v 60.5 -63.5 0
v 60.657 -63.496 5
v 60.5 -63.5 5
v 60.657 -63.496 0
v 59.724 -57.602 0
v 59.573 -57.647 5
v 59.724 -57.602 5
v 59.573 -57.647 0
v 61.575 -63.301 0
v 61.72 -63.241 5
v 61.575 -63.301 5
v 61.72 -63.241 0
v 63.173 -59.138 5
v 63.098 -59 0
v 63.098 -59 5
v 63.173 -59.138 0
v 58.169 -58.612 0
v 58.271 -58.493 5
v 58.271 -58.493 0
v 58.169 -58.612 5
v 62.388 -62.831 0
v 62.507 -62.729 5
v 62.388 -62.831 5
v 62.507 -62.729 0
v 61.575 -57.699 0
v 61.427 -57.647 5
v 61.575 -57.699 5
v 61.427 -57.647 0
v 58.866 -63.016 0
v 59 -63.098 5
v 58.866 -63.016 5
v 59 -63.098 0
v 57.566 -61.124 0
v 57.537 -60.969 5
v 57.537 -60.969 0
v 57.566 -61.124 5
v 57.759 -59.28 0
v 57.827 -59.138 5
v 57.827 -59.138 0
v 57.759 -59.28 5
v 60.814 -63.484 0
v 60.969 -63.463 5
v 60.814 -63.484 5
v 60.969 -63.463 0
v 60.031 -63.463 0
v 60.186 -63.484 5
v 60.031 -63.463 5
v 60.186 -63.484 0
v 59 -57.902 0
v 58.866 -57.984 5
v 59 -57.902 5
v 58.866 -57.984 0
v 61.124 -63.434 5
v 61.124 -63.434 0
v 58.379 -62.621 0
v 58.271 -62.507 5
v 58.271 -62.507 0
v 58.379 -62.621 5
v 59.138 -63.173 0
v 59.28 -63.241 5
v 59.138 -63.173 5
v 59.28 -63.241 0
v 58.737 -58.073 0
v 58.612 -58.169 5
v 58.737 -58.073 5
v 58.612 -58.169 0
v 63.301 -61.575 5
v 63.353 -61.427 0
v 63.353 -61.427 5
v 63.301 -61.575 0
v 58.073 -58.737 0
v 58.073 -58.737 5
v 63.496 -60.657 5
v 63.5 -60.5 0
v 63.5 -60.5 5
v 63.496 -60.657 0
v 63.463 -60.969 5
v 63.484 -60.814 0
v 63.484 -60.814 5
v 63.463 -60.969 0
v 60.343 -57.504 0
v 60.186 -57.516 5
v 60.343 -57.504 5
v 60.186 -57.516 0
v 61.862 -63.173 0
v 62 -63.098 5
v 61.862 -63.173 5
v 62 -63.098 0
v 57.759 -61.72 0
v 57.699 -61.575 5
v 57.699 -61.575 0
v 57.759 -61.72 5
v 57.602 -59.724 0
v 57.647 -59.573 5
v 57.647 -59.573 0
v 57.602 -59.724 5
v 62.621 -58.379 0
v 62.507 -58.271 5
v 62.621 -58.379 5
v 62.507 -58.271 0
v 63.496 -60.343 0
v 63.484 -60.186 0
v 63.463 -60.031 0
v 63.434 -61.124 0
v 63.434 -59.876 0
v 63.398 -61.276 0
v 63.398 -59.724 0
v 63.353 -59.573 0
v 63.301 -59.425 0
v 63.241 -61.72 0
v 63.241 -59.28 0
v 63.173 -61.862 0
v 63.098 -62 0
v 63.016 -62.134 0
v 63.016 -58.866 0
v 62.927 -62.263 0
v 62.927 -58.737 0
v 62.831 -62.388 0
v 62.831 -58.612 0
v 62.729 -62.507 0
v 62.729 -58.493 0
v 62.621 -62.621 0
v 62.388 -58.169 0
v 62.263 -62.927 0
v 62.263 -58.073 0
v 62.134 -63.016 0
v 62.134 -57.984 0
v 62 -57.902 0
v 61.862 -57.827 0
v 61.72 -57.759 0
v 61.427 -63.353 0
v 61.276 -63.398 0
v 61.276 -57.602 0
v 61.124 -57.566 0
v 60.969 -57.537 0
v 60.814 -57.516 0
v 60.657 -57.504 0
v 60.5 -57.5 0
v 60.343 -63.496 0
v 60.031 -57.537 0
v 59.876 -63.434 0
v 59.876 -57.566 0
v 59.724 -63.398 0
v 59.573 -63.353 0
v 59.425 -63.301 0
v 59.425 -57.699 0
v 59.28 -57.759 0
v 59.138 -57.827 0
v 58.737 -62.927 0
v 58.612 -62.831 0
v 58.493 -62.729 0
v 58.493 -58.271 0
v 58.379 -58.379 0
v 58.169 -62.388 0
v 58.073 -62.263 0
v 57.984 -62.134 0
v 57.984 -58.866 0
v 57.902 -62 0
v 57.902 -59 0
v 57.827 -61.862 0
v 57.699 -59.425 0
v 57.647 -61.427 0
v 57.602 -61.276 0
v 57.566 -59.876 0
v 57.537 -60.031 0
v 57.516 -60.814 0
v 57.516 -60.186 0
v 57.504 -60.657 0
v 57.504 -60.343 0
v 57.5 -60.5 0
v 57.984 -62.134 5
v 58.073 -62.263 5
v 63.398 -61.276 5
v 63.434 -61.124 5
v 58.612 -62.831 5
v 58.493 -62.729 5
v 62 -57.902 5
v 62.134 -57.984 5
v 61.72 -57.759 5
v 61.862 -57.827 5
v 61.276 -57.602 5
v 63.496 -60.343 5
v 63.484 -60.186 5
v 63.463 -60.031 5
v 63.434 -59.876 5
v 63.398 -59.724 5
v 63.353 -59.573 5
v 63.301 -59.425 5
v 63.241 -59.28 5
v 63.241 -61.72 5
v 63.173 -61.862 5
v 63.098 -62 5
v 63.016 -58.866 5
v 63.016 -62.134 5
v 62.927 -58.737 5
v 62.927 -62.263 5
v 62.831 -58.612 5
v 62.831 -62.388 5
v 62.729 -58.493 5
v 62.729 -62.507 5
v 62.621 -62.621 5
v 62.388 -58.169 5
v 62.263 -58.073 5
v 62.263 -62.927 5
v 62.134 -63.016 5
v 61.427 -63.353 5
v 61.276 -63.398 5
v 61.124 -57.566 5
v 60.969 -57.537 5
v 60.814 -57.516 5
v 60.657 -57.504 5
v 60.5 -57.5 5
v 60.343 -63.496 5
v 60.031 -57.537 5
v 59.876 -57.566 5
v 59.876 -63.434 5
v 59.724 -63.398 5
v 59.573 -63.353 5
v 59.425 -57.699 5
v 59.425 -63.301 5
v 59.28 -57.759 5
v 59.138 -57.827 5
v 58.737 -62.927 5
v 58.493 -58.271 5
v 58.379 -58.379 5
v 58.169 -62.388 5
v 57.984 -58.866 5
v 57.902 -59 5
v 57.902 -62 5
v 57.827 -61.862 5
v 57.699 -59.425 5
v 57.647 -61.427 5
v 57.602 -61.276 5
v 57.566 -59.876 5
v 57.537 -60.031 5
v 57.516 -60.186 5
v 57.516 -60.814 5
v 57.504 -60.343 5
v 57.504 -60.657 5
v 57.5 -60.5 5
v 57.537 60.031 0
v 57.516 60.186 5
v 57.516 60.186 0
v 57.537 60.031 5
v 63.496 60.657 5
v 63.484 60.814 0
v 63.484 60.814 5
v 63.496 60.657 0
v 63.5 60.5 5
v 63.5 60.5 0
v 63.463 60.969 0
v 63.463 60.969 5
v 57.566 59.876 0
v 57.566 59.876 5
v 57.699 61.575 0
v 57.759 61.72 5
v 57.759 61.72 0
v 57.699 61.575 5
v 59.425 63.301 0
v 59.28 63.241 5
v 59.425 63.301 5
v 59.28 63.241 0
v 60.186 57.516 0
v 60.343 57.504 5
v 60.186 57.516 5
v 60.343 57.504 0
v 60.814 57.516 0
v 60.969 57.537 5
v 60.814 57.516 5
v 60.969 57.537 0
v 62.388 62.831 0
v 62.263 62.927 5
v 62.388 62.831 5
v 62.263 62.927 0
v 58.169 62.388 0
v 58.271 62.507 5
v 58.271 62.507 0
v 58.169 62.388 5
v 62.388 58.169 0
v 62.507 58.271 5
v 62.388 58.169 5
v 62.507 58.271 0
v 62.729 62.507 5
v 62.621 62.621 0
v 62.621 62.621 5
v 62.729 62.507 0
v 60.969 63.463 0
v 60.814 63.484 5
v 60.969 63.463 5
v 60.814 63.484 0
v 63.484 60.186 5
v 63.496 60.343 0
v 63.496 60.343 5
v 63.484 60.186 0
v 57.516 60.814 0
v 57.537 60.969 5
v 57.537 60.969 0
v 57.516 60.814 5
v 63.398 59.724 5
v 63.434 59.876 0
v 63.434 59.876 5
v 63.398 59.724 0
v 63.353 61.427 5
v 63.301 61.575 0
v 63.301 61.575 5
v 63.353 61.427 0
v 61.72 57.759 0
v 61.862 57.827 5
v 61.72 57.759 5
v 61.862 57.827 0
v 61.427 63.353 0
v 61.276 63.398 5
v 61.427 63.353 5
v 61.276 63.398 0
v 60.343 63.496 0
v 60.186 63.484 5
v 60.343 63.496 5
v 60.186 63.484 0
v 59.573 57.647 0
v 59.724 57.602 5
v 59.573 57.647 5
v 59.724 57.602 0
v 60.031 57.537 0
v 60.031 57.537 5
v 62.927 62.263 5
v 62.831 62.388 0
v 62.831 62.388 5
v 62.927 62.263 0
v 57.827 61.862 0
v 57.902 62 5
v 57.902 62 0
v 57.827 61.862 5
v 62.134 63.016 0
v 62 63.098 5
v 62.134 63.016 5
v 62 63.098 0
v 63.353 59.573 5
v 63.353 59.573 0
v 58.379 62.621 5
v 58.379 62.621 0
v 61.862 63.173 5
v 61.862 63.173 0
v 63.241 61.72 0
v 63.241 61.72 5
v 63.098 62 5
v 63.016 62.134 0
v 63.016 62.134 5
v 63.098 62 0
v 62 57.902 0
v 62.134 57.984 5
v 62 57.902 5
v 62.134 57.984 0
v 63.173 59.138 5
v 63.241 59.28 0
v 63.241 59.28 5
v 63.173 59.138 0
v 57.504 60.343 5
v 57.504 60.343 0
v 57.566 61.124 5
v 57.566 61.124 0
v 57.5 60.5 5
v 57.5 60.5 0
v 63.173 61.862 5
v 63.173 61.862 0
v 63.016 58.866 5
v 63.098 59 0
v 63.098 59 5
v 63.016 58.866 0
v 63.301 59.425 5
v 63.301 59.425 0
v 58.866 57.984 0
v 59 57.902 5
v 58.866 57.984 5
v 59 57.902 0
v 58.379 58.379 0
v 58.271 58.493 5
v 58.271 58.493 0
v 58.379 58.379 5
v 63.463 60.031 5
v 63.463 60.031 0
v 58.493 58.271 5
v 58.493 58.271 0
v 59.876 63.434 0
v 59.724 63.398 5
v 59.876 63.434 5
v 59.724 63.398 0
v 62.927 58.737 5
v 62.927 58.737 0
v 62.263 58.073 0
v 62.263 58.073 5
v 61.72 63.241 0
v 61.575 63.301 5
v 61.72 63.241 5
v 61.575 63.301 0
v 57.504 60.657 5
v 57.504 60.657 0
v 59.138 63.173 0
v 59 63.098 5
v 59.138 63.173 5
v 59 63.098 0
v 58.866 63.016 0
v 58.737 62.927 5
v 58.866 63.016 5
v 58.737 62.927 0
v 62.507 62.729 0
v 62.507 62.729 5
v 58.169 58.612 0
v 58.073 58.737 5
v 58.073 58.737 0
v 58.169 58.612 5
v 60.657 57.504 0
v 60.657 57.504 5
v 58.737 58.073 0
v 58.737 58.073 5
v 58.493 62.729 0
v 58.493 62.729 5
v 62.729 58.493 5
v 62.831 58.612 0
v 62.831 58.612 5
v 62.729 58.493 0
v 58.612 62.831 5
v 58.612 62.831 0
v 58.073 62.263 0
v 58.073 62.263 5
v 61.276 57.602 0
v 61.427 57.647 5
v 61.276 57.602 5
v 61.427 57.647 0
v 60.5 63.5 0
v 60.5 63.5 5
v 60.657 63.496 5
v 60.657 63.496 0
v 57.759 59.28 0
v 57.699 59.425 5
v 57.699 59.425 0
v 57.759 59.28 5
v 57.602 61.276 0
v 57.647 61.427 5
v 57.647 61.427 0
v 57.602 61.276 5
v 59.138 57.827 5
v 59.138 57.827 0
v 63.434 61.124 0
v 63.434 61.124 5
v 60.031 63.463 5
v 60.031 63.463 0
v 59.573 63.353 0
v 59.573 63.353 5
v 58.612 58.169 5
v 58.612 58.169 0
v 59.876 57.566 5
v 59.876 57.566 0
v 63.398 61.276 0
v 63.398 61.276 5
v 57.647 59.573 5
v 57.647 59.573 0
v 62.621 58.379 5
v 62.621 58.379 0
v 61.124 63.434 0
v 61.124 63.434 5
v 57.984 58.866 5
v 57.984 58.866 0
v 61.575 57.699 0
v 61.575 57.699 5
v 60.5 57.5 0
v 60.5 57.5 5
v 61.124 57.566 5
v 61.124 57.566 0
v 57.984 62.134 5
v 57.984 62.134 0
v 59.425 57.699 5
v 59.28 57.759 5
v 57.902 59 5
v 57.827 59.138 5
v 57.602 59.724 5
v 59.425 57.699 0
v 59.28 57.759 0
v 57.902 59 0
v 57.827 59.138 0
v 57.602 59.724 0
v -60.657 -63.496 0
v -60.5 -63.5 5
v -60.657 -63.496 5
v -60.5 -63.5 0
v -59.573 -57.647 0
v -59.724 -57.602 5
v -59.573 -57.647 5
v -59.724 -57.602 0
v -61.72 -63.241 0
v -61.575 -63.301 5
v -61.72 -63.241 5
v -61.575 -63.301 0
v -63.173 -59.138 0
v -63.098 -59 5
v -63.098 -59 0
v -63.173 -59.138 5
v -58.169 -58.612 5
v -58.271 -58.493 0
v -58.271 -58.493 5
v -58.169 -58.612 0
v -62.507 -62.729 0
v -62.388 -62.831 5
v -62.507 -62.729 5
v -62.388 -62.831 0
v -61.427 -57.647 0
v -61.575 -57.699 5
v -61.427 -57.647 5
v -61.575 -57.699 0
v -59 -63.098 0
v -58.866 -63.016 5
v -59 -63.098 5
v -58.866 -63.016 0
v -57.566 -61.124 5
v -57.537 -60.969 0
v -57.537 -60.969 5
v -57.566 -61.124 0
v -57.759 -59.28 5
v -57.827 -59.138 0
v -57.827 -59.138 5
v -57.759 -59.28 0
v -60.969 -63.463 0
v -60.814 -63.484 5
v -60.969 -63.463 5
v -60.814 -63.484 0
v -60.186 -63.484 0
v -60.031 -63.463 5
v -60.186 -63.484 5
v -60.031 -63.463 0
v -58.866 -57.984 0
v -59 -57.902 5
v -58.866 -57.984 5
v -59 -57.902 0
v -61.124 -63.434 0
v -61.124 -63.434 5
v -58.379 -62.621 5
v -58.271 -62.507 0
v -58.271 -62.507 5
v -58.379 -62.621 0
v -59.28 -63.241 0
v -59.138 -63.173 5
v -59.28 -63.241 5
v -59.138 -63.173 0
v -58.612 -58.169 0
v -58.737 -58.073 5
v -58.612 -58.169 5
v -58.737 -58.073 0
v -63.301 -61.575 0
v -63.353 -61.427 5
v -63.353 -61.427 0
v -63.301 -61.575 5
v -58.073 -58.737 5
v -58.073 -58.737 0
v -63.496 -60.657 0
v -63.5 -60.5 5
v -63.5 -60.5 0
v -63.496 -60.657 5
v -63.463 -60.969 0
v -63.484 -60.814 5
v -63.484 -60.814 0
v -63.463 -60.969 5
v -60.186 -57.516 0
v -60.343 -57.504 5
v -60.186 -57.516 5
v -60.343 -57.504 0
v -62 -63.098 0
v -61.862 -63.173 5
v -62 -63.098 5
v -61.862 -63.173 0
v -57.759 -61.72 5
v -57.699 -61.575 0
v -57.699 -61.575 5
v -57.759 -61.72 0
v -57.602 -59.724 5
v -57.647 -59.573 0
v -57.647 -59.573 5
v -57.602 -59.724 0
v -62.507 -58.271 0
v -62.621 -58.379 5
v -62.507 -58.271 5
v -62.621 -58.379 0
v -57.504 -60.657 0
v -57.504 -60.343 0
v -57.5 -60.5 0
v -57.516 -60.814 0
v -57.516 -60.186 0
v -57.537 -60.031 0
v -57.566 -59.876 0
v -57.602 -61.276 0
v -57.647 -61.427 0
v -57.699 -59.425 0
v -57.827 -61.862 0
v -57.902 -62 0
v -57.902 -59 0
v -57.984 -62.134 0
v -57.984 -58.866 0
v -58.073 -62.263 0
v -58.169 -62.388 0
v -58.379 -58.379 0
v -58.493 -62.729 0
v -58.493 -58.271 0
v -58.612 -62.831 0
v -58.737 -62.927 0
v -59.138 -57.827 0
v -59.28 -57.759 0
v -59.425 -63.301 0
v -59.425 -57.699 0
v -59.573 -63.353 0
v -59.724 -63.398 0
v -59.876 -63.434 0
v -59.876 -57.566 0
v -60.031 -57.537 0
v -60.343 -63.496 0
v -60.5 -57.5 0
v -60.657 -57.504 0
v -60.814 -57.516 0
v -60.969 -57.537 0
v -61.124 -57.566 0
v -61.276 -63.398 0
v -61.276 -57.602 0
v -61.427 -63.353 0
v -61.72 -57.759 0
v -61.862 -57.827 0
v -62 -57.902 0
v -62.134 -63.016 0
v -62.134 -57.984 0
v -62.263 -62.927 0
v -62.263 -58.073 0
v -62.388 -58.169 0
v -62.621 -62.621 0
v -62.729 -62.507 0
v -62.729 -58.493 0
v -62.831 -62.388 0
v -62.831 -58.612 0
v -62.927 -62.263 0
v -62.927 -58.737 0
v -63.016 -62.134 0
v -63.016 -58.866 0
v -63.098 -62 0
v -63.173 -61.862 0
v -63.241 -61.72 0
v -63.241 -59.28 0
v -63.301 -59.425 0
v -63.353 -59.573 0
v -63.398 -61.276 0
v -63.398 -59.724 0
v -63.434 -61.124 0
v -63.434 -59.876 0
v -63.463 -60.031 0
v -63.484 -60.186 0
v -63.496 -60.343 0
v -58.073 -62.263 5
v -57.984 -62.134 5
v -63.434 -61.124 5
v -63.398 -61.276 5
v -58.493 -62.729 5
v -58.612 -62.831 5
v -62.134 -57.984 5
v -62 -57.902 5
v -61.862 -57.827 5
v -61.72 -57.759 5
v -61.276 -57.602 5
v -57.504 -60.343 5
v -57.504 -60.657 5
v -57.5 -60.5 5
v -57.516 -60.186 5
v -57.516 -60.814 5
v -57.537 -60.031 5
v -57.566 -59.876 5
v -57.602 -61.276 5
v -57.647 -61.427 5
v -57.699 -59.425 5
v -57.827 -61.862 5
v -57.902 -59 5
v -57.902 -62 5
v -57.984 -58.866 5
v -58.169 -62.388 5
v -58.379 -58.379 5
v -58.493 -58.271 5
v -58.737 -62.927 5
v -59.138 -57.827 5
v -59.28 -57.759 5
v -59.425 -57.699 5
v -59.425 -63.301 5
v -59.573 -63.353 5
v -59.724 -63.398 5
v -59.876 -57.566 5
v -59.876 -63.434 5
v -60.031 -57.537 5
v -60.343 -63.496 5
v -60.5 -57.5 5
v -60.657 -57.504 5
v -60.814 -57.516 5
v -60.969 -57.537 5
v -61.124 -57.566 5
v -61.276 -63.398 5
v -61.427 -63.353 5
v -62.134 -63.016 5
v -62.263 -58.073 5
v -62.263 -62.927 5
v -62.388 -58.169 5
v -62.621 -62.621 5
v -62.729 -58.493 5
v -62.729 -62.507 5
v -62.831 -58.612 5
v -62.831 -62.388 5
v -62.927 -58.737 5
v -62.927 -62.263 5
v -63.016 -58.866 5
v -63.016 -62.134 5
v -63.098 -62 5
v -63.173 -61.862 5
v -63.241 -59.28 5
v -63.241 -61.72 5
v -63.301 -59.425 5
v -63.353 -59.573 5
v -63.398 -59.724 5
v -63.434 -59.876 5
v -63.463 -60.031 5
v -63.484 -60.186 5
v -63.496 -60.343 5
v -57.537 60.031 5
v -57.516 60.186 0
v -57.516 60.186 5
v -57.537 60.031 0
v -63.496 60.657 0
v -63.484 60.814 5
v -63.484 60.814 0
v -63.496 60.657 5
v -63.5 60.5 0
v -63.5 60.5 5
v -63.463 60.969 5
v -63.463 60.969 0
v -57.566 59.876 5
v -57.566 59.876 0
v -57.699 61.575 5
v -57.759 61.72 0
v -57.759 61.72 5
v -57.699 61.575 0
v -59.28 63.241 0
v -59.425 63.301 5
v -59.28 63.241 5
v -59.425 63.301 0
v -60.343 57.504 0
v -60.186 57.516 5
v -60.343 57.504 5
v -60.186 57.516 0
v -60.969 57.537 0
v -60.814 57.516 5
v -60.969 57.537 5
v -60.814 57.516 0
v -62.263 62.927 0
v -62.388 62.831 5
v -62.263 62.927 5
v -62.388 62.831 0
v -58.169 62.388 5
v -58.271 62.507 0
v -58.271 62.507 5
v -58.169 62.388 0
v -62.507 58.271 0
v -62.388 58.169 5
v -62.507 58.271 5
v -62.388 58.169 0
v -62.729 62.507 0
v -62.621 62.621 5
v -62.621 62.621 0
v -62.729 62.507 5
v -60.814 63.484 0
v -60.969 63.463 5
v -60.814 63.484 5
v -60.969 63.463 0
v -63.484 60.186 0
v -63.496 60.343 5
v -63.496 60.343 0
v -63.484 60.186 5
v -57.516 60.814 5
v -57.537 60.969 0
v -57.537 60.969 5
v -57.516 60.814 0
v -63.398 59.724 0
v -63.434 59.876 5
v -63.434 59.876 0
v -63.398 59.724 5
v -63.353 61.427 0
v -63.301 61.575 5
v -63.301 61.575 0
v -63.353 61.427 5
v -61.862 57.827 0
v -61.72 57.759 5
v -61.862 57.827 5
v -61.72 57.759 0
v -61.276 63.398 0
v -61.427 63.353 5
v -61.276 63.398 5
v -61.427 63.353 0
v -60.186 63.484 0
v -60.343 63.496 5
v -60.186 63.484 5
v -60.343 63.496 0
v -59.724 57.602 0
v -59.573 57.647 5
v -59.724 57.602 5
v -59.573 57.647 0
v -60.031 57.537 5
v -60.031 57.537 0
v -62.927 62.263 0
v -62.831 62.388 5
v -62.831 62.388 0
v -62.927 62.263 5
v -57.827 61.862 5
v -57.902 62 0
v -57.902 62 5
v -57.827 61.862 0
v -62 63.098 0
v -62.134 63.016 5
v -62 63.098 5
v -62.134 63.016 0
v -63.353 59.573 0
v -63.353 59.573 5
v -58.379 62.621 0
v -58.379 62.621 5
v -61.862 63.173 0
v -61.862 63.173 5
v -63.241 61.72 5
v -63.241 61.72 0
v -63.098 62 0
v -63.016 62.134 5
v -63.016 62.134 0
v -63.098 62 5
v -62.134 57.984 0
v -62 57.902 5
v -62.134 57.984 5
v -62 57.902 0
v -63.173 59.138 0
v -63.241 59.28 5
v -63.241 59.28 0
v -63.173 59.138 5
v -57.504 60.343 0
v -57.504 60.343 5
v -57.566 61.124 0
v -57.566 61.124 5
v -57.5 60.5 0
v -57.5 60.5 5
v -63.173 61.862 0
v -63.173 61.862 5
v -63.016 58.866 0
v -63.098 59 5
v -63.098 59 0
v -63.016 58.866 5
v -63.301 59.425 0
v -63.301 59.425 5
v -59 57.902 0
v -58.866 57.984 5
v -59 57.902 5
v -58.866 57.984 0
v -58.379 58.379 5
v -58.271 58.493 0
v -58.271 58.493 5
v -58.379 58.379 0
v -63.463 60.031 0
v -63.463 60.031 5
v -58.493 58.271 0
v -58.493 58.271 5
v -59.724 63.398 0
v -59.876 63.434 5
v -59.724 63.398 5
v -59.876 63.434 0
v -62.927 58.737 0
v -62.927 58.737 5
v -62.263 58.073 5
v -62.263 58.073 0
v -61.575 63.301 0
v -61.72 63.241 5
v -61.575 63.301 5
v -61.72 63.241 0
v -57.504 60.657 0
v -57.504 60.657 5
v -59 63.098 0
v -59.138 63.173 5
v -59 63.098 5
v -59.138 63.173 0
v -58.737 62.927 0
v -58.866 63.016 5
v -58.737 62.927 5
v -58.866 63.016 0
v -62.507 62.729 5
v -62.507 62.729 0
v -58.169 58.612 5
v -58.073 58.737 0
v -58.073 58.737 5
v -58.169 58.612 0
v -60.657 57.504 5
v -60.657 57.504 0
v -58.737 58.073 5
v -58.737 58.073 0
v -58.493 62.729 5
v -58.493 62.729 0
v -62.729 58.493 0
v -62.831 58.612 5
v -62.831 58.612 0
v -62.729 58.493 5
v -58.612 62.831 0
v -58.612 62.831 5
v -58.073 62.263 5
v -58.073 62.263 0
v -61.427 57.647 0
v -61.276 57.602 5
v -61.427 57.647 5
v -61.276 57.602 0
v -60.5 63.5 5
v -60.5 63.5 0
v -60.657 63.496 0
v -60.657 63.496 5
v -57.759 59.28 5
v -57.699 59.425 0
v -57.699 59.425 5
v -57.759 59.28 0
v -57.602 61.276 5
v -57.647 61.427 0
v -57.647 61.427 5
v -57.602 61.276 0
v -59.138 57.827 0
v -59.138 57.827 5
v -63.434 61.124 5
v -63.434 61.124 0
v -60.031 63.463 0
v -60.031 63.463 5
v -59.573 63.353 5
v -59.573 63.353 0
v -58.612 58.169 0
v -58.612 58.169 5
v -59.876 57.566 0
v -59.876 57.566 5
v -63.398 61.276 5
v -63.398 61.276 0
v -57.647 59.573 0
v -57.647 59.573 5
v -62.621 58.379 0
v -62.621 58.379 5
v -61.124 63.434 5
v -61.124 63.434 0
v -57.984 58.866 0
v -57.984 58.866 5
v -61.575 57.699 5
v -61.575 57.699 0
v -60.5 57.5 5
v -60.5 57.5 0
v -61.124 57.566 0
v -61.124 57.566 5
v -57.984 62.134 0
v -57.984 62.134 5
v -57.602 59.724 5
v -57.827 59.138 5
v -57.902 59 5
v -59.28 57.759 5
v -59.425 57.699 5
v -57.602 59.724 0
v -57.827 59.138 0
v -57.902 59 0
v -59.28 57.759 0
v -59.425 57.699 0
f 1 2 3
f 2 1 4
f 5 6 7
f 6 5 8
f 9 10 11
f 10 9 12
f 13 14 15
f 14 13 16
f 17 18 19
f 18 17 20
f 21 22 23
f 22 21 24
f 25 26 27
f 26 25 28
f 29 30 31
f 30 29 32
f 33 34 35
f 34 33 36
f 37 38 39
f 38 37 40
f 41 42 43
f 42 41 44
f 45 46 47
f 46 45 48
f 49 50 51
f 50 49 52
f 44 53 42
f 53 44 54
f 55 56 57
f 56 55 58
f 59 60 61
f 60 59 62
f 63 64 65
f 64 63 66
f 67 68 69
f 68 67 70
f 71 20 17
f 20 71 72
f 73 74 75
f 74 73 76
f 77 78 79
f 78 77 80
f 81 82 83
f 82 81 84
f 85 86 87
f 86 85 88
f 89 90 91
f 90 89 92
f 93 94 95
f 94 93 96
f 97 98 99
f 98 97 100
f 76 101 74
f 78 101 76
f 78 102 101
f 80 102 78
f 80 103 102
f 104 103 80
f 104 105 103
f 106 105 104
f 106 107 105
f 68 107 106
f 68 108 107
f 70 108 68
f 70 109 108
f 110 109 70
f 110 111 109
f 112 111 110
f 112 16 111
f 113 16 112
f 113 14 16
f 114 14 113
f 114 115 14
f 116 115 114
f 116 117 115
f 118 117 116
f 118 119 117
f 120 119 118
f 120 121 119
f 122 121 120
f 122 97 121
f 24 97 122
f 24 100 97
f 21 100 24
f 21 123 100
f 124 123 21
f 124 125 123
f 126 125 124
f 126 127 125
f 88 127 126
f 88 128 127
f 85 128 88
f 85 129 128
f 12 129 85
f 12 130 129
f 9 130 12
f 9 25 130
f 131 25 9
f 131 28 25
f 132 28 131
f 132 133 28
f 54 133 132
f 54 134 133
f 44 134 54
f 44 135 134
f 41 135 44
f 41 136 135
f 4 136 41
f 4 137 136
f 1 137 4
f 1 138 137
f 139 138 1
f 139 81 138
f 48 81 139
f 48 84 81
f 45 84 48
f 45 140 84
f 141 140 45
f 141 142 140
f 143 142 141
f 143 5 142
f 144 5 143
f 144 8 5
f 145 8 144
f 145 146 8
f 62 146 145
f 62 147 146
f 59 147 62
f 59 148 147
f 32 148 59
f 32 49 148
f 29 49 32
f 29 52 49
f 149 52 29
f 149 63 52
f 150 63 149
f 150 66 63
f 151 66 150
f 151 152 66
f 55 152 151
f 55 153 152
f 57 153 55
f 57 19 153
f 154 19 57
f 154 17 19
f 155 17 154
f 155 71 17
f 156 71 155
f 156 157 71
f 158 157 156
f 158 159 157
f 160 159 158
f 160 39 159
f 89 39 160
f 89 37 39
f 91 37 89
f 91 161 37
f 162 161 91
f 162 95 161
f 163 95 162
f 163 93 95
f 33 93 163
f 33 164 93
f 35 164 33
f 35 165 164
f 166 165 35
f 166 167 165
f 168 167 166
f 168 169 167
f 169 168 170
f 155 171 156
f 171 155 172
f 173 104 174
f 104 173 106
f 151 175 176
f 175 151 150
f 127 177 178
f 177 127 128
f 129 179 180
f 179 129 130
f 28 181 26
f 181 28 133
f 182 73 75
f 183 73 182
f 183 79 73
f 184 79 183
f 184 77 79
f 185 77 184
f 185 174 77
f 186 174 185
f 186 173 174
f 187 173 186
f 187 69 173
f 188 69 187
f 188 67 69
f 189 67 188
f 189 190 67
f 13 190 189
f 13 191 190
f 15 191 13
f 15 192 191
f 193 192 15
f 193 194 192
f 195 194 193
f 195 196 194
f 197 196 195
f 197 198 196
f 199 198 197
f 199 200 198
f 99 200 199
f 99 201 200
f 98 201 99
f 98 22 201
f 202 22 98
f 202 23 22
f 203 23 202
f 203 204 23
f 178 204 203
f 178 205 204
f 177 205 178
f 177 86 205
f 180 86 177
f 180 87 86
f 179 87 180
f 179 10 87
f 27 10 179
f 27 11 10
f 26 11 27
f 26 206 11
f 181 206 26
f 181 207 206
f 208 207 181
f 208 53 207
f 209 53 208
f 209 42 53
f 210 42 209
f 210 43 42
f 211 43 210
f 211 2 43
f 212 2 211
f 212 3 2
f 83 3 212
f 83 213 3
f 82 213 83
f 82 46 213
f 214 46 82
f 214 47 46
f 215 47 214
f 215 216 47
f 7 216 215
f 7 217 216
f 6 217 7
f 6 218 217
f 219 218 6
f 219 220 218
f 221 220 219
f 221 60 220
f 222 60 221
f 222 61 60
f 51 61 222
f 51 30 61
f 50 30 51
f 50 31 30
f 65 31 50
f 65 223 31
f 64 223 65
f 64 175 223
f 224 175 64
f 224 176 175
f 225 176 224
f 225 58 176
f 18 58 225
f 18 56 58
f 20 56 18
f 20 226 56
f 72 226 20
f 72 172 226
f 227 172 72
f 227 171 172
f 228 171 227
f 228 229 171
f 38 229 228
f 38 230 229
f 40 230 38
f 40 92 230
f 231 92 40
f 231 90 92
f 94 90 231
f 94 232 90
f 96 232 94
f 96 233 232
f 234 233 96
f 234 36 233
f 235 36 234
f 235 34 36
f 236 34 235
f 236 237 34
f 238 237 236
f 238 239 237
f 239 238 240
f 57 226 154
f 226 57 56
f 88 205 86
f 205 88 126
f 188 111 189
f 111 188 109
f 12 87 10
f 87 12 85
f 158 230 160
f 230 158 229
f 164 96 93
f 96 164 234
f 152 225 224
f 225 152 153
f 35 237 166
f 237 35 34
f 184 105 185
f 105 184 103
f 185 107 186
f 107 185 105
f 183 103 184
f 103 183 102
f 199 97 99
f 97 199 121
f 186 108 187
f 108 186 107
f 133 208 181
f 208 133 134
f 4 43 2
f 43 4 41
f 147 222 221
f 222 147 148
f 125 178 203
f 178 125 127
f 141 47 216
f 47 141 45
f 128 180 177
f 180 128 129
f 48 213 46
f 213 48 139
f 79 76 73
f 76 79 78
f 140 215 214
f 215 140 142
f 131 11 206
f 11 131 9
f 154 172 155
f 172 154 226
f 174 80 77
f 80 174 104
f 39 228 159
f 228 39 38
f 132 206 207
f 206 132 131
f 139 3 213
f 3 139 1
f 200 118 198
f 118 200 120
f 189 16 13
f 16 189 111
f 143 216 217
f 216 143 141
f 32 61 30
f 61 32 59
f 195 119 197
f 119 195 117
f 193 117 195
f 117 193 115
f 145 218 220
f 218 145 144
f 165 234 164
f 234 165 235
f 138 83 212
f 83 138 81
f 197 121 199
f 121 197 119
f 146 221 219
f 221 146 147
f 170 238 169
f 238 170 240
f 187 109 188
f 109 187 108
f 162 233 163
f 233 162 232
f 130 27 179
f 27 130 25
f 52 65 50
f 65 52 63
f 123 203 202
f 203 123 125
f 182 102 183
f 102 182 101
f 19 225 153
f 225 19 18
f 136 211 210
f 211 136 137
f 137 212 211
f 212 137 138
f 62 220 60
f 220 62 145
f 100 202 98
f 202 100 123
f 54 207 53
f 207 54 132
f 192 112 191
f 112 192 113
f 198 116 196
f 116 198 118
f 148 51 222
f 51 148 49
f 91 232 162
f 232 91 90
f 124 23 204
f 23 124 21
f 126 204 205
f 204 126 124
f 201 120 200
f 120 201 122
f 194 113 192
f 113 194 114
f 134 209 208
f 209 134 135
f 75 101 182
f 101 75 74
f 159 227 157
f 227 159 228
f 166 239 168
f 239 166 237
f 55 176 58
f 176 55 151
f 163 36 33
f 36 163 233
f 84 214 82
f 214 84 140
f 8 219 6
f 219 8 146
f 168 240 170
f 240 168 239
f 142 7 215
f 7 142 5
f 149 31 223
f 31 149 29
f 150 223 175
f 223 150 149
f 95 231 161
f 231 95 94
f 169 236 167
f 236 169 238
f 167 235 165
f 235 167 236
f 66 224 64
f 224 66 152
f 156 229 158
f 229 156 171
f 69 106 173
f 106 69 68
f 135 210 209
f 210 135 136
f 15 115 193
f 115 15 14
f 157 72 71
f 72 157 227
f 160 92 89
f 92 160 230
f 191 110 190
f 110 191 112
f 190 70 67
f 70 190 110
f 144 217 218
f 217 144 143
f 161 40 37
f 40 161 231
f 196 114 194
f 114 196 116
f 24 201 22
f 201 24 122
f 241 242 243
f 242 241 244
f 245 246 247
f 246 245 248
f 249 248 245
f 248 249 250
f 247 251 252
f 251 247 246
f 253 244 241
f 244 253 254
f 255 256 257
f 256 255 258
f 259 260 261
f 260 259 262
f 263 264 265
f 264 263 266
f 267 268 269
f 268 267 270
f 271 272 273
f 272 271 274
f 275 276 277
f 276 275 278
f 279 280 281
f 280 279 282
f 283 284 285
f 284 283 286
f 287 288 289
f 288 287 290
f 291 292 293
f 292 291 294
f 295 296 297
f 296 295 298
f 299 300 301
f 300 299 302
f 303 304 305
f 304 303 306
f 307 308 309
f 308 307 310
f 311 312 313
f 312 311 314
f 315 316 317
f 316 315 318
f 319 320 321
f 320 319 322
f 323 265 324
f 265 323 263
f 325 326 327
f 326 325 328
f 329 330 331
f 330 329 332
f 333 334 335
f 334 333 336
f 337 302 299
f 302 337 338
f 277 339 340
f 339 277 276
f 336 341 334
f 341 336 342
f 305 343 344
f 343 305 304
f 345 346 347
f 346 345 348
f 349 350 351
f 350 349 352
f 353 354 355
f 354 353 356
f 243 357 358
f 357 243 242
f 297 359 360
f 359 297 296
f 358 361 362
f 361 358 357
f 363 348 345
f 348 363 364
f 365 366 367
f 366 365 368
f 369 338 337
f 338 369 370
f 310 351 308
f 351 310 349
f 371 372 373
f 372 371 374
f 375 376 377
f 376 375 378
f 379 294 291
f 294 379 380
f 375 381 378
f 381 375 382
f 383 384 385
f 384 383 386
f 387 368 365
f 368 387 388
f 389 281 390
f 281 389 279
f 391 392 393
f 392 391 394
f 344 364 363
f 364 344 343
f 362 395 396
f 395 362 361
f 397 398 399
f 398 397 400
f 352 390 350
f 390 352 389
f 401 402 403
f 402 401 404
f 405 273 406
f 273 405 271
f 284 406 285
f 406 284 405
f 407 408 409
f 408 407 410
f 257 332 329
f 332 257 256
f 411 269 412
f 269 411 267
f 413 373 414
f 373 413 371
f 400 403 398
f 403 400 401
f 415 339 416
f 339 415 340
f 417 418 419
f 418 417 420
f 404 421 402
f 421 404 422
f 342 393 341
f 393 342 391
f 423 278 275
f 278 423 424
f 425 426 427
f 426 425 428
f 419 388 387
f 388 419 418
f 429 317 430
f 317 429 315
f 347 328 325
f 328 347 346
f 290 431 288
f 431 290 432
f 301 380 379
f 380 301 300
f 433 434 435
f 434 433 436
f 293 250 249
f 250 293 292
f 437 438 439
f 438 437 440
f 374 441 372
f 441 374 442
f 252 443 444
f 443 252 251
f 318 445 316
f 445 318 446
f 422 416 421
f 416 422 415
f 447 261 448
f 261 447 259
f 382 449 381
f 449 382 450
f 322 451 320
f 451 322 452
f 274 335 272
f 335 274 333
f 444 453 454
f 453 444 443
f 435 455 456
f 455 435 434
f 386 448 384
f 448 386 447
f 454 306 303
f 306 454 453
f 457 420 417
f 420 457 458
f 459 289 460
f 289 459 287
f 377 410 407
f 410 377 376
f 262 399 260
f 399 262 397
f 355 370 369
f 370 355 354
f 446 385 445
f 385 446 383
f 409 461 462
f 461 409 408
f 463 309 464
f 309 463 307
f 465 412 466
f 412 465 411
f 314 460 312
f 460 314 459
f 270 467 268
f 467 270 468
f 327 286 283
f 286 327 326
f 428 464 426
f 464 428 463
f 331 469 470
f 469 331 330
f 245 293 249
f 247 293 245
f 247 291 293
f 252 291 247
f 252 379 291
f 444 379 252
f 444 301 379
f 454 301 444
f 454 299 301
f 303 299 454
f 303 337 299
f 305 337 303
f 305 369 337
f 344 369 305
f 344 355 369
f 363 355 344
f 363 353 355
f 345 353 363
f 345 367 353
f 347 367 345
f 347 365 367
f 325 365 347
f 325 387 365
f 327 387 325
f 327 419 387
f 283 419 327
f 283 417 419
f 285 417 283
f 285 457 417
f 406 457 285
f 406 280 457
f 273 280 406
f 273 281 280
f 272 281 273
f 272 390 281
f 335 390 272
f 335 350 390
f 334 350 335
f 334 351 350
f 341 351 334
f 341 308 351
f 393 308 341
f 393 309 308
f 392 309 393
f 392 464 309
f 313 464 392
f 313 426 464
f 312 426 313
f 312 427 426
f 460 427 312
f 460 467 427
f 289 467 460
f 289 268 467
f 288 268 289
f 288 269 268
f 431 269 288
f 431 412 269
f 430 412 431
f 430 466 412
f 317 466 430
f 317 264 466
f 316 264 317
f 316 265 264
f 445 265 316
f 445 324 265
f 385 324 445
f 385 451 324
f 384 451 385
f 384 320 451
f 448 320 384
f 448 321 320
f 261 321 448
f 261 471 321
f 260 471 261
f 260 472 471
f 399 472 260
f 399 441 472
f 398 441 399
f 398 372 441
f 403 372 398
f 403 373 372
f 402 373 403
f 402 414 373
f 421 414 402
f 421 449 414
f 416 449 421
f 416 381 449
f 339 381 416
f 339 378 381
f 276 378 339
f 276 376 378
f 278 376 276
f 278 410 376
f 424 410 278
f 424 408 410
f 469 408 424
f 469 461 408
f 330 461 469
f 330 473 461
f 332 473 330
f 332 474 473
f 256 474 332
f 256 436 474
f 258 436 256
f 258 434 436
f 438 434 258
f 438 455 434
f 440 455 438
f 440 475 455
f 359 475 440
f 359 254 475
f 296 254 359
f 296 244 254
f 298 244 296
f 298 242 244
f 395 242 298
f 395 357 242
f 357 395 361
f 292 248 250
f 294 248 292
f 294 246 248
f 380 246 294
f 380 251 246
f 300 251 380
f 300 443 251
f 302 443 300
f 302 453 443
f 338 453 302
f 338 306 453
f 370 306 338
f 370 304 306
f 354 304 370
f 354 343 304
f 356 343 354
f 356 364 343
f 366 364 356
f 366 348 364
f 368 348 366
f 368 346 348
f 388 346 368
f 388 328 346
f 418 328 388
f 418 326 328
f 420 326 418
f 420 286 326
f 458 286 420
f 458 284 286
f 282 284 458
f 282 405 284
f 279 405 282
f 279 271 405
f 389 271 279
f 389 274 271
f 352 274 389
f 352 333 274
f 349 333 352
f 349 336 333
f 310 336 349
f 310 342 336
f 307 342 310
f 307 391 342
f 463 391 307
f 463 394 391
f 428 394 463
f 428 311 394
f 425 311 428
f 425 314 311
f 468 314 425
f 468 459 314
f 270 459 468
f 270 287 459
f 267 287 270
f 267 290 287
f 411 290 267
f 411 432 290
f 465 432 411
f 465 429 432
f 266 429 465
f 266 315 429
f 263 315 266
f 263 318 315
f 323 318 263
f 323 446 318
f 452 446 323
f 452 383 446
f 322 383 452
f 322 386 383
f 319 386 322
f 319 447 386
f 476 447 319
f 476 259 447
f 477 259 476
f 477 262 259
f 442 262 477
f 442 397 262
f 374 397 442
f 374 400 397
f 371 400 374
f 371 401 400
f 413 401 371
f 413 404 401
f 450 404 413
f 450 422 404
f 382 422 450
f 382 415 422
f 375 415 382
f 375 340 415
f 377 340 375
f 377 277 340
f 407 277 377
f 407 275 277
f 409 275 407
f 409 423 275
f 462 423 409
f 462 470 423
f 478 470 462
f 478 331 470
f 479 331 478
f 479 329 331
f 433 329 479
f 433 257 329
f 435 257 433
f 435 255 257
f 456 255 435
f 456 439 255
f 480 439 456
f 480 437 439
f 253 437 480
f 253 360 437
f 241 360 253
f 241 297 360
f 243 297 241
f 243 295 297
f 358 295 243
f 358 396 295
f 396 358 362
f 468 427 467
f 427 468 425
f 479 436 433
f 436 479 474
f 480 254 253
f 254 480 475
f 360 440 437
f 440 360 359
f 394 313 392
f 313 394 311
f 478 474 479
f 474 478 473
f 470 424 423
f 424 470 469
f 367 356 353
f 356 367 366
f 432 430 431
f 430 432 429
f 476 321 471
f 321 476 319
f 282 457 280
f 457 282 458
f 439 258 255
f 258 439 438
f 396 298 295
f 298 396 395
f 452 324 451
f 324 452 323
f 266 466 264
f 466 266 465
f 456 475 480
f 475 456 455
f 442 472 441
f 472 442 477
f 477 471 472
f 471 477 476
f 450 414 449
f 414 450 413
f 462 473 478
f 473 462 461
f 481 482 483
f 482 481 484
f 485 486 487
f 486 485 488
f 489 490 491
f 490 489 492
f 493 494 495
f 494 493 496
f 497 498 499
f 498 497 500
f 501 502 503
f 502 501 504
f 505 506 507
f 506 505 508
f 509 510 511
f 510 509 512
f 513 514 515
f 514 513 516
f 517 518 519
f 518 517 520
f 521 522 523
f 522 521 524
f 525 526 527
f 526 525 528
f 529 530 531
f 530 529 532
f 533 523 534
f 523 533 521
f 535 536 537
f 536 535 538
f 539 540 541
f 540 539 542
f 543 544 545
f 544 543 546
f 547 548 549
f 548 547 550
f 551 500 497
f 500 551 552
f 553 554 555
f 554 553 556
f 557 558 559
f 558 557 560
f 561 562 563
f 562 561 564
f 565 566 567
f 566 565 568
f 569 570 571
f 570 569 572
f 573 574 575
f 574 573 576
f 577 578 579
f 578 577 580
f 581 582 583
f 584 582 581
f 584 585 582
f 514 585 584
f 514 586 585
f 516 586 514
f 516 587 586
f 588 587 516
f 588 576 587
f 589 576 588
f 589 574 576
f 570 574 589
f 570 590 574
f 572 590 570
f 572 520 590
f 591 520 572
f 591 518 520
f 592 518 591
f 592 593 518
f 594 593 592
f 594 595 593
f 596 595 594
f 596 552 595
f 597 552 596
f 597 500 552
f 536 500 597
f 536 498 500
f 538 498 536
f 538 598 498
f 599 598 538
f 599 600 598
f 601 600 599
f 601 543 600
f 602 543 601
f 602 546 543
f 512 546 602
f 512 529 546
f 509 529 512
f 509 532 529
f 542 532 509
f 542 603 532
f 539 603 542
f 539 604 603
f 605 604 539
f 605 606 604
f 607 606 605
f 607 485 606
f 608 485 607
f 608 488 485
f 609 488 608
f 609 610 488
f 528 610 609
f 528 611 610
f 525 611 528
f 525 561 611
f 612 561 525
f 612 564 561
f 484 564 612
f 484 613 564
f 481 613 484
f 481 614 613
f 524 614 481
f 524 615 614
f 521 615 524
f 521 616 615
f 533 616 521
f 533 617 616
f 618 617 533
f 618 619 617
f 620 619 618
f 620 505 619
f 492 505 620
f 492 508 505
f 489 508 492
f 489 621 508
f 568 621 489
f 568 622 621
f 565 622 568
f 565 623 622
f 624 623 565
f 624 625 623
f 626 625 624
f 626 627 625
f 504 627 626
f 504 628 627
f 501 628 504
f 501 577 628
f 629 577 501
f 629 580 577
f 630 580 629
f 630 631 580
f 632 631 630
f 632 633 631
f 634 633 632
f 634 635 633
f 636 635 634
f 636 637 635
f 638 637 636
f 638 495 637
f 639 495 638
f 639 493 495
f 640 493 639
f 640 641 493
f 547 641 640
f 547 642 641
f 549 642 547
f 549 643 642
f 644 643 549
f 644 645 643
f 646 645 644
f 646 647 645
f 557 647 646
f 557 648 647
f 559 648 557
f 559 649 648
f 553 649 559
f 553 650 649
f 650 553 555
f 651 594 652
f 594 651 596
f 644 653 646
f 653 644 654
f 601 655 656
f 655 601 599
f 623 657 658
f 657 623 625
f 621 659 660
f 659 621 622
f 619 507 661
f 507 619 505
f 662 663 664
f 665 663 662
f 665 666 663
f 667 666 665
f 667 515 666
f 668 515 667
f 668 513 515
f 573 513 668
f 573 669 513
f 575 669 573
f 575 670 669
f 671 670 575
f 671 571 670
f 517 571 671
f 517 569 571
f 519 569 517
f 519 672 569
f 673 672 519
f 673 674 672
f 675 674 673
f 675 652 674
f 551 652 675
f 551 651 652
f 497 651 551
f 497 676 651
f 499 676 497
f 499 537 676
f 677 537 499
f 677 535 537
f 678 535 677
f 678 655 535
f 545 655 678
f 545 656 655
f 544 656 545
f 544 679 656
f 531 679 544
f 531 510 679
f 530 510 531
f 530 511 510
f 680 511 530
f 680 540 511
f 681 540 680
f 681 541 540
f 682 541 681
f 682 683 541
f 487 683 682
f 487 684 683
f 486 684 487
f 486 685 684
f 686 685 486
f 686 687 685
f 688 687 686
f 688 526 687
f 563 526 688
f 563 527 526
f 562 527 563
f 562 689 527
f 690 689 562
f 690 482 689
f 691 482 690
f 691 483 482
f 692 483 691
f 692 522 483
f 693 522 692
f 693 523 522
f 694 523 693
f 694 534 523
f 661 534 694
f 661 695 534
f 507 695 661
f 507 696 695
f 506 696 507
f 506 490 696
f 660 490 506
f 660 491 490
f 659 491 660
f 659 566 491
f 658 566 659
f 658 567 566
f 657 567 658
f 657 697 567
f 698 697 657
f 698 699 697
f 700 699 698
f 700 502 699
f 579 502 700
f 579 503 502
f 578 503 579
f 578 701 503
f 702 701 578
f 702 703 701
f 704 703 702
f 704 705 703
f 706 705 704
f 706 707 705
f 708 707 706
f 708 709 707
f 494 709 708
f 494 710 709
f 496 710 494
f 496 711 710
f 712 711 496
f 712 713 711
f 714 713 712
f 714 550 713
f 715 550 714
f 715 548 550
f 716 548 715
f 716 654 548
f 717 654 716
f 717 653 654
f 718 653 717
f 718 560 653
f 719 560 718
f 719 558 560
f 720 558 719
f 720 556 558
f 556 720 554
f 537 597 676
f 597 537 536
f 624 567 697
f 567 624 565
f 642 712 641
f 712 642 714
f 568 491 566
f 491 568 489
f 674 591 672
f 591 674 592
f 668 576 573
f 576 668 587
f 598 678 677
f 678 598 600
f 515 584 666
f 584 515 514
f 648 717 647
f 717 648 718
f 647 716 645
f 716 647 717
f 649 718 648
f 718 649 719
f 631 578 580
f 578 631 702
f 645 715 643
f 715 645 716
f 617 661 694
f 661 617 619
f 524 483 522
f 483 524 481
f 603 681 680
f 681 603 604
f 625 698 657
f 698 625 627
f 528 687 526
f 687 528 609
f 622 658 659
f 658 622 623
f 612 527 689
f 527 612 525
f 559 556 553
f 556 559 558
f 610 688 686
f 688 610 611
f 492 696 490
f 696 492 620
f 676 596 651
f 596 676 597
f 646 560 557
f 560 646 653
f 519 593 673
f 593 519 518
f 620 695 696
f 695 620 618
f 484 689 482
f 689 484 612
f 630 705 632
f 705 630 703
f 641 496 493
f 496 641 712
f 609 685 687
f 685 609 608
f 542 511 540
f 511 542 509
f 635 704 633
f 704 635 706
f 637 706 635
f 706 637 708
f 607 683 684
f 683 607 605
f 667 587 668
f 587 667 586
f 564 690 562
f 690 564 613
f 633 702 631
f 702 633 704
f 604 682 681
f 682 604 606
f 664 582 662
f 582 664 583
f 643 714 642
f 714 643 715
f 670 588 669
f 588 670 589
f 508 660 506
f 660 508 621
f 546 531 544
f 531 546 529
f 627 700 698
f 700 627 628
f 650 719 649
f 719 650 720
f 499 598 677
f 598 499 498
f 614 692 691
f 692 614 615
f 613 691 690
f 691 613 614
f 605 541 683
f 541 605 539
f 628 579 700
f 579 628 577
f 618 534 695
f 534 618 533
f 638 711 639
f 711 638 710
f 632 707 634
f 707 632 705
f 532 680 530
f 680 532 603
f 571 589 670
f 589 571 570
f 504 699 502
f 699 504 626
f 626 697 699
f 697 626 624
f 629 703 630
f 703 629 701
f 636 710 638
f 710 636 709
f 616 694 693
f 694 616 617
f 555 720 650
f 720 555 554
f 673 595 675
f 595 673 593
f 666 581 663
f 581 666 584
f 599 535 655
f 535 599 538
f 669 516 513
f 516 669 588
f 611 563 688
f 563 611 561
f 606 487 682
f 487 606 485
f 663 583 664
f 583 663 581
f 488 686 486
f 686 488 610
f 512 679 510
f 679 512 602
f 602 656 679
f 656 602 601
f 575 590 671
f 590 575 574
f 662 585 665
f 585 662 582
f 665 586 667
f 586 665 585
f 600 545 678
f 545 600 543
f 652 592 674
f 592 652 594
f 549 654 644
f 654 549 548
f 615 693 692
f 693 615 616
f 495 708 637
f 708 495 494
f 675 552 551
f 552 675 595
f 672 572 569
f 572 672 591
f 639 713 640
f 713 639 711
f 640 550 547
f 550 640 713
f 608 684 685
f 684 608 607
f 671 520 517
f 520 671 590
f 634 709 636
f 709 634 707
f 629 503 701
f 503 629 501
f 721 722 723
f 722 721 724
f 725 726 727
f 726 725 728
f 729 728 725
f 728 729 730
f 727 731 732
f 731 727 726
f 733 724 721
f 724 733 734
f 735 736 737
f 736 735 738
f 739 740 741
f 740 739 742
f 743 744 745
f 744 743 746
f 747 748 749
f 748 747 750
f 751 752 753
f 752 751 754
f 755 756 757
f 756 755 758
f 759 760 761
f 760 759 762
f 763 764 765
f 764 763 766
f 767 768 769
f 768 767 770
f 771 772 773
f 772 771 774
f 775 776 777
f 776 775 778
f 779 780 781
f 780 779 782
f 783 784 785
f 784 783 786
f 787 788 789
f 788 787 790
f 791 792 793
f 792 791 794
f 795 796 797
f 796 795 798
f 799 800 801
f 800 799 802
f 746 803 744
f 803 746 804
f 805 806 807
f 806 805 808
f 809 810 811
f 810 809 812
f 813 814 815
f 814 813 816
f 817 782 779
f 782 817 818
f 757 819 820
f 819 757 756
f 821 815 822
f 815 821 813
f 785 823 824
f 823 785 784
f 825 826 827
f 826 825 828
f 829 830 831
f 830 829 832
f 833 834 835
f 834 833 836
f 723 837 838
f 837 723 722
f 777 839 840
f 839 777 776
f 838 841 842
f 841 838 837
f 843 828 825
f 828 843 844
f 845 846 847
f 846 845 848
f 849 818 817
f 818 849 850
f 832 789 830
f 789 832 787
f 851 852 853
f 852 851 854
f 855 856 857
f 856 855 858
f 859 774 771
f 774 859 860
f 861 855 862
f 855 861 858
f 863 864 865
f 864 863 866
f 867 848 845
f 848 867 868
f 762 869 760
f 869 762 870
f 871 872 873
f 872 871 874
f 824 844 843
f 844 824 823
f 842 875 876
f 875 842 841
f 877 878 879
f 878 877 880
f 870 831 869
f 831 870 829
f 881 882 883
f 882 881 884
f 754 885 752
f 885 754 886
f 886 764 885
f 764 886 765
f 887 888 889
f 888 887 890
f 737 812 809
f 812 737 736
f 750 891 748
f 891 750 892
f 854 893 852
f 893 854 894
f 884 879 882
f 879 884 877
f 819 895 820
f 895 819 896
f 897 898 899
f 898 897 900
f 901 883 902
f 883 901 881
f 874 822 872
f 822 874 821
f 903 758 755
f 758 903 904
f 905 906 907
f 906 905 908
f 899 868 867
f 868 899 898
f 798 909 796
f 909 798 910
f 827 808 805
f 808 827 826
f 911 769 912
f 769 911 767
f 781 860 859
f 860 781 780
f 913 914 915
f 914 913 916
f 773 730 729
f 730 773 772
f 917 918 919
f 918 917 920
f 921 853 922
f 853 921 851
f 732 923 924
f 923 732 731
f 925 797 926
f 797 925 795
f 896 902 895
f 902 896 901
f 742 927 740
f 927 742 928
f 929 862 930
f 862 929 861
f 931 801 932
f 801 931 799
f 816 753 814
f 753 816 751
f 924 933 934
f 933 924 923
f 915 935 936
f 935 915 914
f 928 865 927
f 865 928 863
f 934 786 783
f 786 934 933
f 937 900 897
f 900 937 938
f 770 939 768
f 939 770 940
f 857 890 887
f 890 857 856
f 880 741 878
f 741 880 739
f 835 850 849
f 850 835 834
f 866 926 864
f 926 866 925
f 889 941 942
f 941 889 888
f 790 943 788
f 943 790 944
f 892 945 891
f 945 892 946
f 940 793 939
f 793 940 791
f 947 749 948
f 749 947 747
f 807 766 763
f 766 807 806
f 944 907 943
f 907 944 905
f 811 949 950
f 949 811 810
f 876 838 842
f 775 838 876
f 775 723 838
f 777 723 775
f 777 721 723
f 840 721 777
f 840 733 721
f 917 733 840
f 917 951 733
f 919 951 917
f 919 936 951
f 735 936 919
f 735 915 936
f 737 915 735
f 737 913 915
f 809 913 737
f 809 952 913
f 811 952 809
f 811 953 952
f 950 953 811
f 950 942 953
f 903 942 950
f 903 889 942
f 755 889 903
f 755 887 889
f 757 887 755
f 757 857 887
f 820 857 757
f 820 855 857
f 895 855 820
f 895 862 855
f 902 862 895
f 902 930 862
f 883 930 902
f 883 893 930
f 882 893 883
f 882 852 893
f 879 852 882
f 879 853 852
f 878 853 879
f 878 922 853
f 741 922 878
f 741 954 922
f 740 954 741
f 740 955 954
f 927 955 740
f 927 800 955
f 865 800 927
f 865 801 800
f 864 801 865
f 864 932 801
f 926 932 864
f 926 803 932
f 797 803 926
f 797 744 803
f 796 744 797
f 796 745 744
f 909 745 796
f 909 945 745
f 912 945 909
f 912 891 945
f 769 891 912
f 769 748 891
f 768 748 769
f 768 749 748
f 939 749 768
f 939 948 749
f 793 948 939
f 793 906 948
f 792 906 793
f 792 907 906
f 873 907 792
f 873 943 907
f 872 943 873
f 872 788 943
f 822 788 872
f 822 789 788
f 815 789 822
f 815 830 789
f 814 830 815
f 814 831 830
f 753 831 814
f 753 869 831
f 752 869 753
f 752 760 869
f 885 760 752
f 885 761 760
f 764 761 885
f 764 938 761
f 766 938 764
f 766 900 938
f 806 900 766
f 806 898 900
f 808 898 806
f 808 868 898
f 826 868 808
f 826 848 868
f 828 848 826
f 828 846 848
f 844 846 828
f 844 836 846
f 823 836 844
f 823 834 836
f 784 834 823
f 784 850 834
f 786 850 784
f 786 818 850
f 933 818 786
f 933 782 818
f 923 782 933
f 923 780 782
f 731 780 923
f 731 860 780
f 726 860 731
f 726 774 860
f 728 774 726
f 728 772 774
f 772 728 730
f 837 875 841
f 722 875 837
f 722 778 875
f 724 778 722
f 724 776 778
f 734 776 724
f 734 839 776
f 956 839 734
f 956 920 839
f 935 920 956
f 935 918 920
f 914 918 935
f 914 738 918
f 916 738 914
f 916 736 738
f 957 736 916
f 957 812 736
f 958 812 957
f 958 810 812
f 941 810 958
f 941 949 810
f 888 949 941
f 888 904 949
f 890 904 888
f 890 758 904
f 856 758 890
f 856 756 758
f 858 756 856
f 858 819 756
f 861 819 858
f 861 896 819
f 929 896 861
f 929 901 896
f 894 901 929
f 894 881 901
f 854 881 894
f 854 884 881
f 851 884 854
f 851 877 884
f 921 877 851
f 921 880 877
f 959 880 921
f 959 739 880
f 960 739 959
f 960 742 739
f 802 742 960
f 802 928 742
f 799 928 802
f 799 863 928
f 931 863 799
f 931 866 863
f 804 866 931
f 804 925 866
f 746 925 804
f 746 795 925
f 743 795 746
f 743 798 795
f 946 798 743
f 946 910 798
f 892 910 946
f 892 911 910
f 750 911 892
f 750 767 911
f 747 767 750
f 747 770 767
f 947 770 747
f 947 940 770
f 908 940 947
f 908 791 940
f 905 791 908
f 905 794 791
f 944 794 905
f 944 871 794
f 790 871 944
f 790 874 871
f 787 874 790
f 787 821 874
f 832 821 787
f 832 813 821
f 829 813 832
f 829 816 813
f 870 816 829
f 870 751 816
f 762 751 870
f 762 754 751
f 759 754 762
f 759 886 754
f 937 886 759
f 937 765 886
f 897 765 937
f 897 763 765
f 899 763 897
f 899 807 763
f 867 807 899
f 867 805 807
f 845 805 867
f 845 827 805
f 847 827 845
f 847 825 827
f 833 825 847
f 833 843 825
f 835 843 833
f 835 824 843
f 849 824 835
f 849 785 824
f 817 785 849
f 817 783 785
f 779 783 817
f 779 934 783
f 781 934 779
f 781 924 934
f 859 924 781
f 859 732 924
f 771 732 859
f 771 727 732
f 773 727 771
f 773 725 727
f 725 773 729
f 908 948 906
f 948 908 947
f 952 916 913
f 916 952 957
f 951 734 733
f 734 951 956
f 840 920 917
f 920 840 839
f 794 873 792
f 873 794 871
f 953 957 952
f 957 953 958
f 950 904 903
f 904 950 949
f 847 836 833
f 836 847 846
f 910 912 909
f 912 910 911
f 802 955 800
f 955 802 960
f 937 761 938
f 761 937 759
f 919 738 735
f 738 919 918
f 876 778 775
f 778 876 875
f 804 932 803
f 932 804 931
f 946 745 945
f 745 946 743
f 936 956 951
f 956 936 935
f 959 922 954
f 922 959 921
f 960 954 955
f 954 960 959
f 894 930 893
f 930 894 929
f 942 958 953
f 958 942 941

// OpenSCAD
// file: utility.scad
module tx(x) { translate([ x, 0, 0 ]) children(); }
module ty(y) { translate([ 0, y, 0 ]) children(); }
module tz(z) { translate([ 0, 0, z ]) children(); }
module txy(x, y) { translate([ x, y, 0 ]) children(); }
module txz(x, z) { translate([ x, 0, z ]) children(); }
module tyz(y, z) { translate([ 0, y, z ]) children(); }
module txyz(x, y, z) { translate([ x, y, z ]) children(); }
module rx(x) { rotate([ x, 0, 0 ]) children(); }
module ry(y) { rotate([ 0, y, 0 ]) children(); }
module rz(z) { rotate([ 0, 0, z ]) children(); }
module mx() {
	mirror([ 1, 0, 0 ]) children();
	children();
}
module my() {
	mirror([ 0, 1, 0 ]) children();
	children();
}
module mz() {
	mirror([ 0, 0, 1 ]) children();
	children();
}
module torus(r1, r2) { rotate_extrude(angle = 360) tx(r1) circle(r = r2); }

module tri(side = 10, center = false) {
	if (center) {
		polygon(points =
		            [for (i = [0:2])[side / 2 / sin(60) * sin(120 * i + 0),
		                             side / 2 / sin(60) * cos(120 * i + 0)]]);
	} else {
		polygon(points = [
			[ 0, 0 ], [ side * cos(30), side / 2 ],
			[ side * cos(30), -side / 2 ]
		]);
	}
}

module rsquare(size = [ 10, 10 ], r = 2) {
	union() {
		square([ size.x, size.y - 2 * r ], center = true);
		square([ size.x - 2 * r, size.y ], center = true);
		translate([ size.x / 2 - r, size.y / 2 - r ]) circle(r = r);
		translate([ size.x / 2 - r, -size.y / 2 + r ]) circle(r = r);
		translate([ -size.x / 2 + r, size.y / 2 - r ]) circle(r = r);
		translate([ -size.x / 2 + r, -size.y / 2 + r ]) circle(r = r);
	}
}

module counterSink(screwDiameter = 3, tol = 0.4, height = 3) {
	union() {
		cylinder(r1 = (screwDiameter + tol) / 2,
		         r2 = (screwDiameter + tol) / 2 + height, h = height);
		cylinder(r = (screwDiameter + tol) / 2, h = height * 2, center = true);
	}
}

module skew(sk = [ 0, 0 ]) {
	multmatrix([
		[ 1, 0, sk.x, 0 ],
		[ 0, 1, sk.y, 0 ],
		[ 0, 0, 1, 0 ],
		[ 0, 0, 0, 1 ],
	]) children();
}
// main file
use <utility.scad>;
$fn = 120;

tol = 0.4;
diceDiameter = 23;
diceHeight = 20;
diceSpacing = 1.2;
diceRadius = diceDiameter / 2;
diceDistance = diceDiameter + diceSpacing;

module lidMagnetPlacement() {
	mx() my() {
		diag = diceDistance * 2.5;
		txy(diag, diag) children();
	}
}

module baseMagnetPlacement() {
	mx() my() {
		diag = diceDistance * 2.5;
		txy(diag, diag) children();
	}
}

baseMagnetPlacement() { cylinder(d = 6, h = 5); }
